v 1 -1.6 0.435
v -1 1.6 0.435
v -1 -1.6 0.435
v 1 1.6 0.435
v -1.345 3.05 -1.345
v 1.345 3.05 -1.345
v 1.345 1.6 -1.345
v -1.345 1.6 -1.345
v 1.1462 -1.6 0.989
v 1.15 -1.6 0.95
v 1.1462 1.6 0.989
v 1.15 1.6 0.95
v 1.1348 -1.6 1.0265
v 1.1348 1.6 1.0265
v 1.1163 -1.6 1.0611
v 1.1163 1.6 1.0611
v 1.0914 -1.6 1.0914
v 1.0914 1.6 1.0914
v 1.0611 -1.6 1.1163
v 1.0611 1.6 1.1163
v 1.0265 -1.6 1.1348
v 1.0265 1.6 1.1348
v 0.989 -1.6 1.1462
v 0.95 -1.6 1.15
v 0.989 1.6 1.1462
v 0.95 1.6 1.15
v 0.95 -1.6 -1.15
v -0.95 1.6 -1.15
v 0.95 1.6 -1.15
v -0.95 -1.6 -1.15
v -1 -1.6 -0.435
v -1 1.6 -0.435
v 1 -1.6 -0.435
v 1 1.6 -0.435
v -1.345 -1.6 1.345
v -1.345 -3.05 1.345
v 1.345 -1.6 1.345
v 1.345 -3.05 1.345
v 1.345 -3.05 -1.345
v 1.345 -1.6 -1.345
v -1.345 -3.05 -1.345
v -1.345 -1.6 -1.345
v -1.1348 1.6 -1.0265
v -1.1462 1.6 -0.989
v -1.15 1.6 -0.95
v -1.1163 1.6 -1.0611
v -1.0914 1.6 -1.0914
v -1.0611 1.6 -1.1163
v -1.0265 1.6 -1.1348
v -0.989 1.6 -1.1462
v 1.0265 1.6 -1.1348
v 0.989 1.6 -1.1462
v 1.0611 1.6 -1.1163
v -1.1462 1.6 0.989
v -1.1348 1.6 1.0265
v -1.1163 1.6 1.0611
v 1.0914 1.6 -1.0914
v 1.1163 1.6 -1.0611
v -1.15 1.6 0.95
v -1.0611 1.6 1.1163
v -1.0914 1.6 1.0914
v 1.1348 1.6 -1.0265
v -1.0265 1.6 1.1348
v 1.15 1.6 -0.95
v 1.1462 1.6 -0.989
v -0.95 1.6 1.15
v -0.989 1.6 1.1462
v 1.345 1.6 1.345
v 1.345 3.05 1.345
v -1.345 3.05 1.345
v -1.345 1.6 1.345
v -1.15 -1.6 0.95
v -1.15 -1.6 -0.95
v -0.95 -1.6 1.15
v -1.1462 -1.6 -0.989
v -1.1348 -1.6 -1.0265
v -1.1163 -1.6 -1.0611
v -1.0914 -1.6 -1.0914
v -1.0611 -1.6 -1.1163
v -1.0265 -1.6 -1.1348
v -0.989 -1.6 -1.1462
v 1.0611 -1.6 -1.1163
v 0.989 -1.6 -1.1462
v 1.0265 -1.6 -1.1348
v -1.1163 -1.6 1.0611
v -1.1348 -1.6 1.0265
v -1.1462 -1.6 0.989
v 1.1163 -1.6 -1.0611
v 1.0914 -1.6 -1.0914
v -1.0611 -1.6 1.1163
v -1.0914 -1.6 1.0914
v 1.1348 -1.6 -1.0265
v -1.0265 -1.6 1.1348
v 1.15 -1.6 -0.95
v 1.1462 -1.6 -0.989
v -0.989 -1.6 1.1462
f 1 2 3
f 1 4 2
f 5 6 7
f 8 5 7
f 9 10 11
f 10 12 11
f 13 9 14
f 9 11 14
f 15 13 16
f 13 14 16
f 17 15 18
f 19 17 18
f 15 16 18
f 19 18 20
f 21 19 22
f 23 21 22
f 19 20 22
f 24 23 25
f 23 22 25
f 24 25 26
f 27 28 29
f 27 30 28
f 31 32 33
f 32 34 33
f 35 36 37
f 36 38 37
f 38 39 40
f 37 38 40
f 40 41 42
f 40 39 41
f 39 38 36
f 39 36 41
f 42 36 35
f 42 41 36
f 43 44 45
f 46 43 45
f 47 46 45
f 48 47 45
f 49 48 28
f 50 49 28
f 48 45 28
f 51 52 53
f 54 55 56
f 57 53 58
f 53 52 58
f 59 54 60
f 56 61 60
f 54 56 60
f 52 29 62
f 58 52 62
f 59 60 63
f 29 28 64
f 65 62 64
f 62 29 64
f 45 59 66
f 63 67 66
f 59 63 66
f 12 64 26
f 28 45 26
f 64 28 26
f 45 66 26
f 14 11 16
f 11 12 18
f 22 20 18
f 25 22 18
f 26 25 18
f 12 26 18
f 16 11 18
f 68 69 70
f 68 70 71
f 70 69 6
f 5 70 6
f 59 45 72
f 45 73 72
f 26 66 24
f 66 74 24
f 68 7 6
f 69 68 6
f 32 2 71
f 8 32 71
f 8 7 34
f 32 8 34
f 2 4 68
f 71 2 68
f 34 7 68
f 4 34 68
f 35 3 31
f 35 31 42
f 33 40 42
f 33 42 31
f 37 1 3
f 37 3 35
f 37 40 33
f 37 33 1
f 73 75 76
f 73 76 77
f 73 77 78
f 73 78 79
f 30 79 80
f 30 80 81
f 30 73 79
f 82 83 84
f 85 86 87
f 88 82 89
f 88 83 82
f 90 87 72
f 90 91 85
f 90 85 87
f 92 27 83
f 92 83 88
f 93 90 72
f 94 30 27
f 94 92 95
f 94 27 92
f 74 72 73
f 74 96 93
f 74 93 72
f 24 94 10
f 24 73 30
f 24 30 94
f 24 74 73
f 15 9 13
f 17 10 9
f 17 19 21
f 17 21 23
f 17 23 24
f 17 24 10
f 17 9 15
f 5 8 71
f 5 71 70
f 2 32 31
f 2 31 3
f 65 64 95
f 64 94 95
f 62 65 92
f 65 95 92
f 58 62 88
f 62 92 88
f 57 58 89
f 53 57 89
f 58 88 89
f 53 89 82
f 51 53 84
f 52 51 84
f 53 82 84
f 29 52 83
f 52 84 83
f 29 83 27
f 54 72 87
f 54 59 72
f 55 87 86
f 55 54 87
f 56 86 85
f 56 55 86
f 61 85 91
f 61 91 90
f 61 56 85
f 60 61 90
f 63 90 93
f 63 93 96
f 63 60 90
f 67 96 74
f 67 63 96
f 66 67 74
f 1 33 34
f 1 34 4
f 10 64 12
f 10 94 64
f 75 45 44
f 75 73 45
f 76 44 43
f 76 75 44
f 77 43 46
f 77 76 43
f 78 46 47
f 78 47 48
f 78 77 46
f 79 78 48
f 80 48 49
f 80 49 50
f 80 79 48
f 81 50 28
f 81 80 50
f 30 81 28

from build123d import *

# Parameters (mm, degrees)
SKETCH_W                   = 2.3
SKETCH_H                   = 2.3
PAD_DEPTH                  = 1.6
FILLET_R                   = 0.2
PAD001_DEPTH               = 1.345
PAD001_MIRRORED_2_DEPTH    = 1.345
SKETCH002_W                = 0.4
SKETCH002_H                = 2.3
POCKET_DEPTH               = 1.6
SKETCH002_MIRRORED002_2_W  = 0.4
SKETCH002_MIRRORED002_2_H  = 2.3
POCKET_MIRRORED002_2_DEPTH = 1.6


with BuildPart() as body:
    # Sketch → Pad (new body, symmetric)
    with BuildSketch(Plane.XZ):
        Rectangle(SKETCH_W, SKETCH_H)
    extrude(amount=PAD_DEPTH, both=True)

    # Fillet
    fillet_edges = [body.edges().sort_by_distance(p)[0] for p in [
        (-1.15, 0, 1.15),
        (1.15, 0, 1.15),
        (1.15, 0, -1.15),
        (-1.15, 0, -1.15),
    ]]
    fillet(fillet_edges, radius=FILLET_R)


with BuildPart() as body001:
    # Sketch001 → Pad001 (new body, symmetric)
    with BuildSketch(Plane.YZ):
        Polygon((0, 0), (-3.05, 0), (-3.05, 1.345), (-1.6, 1.345), (-1.6, 0.435), (0, 0.435), align=None)
    pad001 = extrude(amount=PAD001_DEPTH, both=True)

    # Sketch001 Mirrored 2 → Pad001 Mirrored 2 (add, symmetric)
    with BuildSketch(Plane(origin=(0, 0, 0), x_dir=(0, -1, 0), z_dir=(-1, 0, 0))):
        Polygon((0, 0), (-3.05, 0), (-3.05, 1.345), (-1.6, 1.345), (-1.6, 0.435), (0, 0.435), align=None)
    pad001_mirrored_2 = extrude(amount=-PAD001_MIRRORED_2_DEPTH, both=True)

    # Mirrored001: Pad001, Pad001 Mirrored 2 across XY
    add(pad001.mirror(Plane.XY))
    add(pad001_mirrored_2.mirror(Plane.XY))

    # Sketch002 → Pocket (cut)
    with BuildSketch(Plane.XZ):
        with Locations((-1.2, 0)):
            Rectangle(SKETCH002_W, SKETCH002_H)
    pocket = extrude(amount=-POCKET_DEPTH, mode=Mode.SUBTRACT)

    # Sketch002 Mirrored002 2 → Pocket Mirrored002 2 (cut)
    with BuildSketch(Plane(origin=(0, 0, 0), x_dir=(-1, 0, 0), z_dir=(0, 1, 0))):
        with Locations((-1.2, 0)):
            Rectangle(SKETCH002_MIRRORED002_2_W, SKETCH002_MIRRORED002_2_H)
    pocket_mirrored002_2 = extrude(amount=POCKET_MIRRORED002_2_DEPTH, mode=Mode.SUBTRACT)

    # Mirrored003: Pocket, Pocket Mirrored002 2 across XZ
    add(pocket.mirror(Plane.XZ), mode=Mode.SUBTRACT)
    add(pocket_mirrored002_2.mirror(Plane.XZ), mode=Mode.SUBTRACT)


solid = Compound([body.part, body001.part])
